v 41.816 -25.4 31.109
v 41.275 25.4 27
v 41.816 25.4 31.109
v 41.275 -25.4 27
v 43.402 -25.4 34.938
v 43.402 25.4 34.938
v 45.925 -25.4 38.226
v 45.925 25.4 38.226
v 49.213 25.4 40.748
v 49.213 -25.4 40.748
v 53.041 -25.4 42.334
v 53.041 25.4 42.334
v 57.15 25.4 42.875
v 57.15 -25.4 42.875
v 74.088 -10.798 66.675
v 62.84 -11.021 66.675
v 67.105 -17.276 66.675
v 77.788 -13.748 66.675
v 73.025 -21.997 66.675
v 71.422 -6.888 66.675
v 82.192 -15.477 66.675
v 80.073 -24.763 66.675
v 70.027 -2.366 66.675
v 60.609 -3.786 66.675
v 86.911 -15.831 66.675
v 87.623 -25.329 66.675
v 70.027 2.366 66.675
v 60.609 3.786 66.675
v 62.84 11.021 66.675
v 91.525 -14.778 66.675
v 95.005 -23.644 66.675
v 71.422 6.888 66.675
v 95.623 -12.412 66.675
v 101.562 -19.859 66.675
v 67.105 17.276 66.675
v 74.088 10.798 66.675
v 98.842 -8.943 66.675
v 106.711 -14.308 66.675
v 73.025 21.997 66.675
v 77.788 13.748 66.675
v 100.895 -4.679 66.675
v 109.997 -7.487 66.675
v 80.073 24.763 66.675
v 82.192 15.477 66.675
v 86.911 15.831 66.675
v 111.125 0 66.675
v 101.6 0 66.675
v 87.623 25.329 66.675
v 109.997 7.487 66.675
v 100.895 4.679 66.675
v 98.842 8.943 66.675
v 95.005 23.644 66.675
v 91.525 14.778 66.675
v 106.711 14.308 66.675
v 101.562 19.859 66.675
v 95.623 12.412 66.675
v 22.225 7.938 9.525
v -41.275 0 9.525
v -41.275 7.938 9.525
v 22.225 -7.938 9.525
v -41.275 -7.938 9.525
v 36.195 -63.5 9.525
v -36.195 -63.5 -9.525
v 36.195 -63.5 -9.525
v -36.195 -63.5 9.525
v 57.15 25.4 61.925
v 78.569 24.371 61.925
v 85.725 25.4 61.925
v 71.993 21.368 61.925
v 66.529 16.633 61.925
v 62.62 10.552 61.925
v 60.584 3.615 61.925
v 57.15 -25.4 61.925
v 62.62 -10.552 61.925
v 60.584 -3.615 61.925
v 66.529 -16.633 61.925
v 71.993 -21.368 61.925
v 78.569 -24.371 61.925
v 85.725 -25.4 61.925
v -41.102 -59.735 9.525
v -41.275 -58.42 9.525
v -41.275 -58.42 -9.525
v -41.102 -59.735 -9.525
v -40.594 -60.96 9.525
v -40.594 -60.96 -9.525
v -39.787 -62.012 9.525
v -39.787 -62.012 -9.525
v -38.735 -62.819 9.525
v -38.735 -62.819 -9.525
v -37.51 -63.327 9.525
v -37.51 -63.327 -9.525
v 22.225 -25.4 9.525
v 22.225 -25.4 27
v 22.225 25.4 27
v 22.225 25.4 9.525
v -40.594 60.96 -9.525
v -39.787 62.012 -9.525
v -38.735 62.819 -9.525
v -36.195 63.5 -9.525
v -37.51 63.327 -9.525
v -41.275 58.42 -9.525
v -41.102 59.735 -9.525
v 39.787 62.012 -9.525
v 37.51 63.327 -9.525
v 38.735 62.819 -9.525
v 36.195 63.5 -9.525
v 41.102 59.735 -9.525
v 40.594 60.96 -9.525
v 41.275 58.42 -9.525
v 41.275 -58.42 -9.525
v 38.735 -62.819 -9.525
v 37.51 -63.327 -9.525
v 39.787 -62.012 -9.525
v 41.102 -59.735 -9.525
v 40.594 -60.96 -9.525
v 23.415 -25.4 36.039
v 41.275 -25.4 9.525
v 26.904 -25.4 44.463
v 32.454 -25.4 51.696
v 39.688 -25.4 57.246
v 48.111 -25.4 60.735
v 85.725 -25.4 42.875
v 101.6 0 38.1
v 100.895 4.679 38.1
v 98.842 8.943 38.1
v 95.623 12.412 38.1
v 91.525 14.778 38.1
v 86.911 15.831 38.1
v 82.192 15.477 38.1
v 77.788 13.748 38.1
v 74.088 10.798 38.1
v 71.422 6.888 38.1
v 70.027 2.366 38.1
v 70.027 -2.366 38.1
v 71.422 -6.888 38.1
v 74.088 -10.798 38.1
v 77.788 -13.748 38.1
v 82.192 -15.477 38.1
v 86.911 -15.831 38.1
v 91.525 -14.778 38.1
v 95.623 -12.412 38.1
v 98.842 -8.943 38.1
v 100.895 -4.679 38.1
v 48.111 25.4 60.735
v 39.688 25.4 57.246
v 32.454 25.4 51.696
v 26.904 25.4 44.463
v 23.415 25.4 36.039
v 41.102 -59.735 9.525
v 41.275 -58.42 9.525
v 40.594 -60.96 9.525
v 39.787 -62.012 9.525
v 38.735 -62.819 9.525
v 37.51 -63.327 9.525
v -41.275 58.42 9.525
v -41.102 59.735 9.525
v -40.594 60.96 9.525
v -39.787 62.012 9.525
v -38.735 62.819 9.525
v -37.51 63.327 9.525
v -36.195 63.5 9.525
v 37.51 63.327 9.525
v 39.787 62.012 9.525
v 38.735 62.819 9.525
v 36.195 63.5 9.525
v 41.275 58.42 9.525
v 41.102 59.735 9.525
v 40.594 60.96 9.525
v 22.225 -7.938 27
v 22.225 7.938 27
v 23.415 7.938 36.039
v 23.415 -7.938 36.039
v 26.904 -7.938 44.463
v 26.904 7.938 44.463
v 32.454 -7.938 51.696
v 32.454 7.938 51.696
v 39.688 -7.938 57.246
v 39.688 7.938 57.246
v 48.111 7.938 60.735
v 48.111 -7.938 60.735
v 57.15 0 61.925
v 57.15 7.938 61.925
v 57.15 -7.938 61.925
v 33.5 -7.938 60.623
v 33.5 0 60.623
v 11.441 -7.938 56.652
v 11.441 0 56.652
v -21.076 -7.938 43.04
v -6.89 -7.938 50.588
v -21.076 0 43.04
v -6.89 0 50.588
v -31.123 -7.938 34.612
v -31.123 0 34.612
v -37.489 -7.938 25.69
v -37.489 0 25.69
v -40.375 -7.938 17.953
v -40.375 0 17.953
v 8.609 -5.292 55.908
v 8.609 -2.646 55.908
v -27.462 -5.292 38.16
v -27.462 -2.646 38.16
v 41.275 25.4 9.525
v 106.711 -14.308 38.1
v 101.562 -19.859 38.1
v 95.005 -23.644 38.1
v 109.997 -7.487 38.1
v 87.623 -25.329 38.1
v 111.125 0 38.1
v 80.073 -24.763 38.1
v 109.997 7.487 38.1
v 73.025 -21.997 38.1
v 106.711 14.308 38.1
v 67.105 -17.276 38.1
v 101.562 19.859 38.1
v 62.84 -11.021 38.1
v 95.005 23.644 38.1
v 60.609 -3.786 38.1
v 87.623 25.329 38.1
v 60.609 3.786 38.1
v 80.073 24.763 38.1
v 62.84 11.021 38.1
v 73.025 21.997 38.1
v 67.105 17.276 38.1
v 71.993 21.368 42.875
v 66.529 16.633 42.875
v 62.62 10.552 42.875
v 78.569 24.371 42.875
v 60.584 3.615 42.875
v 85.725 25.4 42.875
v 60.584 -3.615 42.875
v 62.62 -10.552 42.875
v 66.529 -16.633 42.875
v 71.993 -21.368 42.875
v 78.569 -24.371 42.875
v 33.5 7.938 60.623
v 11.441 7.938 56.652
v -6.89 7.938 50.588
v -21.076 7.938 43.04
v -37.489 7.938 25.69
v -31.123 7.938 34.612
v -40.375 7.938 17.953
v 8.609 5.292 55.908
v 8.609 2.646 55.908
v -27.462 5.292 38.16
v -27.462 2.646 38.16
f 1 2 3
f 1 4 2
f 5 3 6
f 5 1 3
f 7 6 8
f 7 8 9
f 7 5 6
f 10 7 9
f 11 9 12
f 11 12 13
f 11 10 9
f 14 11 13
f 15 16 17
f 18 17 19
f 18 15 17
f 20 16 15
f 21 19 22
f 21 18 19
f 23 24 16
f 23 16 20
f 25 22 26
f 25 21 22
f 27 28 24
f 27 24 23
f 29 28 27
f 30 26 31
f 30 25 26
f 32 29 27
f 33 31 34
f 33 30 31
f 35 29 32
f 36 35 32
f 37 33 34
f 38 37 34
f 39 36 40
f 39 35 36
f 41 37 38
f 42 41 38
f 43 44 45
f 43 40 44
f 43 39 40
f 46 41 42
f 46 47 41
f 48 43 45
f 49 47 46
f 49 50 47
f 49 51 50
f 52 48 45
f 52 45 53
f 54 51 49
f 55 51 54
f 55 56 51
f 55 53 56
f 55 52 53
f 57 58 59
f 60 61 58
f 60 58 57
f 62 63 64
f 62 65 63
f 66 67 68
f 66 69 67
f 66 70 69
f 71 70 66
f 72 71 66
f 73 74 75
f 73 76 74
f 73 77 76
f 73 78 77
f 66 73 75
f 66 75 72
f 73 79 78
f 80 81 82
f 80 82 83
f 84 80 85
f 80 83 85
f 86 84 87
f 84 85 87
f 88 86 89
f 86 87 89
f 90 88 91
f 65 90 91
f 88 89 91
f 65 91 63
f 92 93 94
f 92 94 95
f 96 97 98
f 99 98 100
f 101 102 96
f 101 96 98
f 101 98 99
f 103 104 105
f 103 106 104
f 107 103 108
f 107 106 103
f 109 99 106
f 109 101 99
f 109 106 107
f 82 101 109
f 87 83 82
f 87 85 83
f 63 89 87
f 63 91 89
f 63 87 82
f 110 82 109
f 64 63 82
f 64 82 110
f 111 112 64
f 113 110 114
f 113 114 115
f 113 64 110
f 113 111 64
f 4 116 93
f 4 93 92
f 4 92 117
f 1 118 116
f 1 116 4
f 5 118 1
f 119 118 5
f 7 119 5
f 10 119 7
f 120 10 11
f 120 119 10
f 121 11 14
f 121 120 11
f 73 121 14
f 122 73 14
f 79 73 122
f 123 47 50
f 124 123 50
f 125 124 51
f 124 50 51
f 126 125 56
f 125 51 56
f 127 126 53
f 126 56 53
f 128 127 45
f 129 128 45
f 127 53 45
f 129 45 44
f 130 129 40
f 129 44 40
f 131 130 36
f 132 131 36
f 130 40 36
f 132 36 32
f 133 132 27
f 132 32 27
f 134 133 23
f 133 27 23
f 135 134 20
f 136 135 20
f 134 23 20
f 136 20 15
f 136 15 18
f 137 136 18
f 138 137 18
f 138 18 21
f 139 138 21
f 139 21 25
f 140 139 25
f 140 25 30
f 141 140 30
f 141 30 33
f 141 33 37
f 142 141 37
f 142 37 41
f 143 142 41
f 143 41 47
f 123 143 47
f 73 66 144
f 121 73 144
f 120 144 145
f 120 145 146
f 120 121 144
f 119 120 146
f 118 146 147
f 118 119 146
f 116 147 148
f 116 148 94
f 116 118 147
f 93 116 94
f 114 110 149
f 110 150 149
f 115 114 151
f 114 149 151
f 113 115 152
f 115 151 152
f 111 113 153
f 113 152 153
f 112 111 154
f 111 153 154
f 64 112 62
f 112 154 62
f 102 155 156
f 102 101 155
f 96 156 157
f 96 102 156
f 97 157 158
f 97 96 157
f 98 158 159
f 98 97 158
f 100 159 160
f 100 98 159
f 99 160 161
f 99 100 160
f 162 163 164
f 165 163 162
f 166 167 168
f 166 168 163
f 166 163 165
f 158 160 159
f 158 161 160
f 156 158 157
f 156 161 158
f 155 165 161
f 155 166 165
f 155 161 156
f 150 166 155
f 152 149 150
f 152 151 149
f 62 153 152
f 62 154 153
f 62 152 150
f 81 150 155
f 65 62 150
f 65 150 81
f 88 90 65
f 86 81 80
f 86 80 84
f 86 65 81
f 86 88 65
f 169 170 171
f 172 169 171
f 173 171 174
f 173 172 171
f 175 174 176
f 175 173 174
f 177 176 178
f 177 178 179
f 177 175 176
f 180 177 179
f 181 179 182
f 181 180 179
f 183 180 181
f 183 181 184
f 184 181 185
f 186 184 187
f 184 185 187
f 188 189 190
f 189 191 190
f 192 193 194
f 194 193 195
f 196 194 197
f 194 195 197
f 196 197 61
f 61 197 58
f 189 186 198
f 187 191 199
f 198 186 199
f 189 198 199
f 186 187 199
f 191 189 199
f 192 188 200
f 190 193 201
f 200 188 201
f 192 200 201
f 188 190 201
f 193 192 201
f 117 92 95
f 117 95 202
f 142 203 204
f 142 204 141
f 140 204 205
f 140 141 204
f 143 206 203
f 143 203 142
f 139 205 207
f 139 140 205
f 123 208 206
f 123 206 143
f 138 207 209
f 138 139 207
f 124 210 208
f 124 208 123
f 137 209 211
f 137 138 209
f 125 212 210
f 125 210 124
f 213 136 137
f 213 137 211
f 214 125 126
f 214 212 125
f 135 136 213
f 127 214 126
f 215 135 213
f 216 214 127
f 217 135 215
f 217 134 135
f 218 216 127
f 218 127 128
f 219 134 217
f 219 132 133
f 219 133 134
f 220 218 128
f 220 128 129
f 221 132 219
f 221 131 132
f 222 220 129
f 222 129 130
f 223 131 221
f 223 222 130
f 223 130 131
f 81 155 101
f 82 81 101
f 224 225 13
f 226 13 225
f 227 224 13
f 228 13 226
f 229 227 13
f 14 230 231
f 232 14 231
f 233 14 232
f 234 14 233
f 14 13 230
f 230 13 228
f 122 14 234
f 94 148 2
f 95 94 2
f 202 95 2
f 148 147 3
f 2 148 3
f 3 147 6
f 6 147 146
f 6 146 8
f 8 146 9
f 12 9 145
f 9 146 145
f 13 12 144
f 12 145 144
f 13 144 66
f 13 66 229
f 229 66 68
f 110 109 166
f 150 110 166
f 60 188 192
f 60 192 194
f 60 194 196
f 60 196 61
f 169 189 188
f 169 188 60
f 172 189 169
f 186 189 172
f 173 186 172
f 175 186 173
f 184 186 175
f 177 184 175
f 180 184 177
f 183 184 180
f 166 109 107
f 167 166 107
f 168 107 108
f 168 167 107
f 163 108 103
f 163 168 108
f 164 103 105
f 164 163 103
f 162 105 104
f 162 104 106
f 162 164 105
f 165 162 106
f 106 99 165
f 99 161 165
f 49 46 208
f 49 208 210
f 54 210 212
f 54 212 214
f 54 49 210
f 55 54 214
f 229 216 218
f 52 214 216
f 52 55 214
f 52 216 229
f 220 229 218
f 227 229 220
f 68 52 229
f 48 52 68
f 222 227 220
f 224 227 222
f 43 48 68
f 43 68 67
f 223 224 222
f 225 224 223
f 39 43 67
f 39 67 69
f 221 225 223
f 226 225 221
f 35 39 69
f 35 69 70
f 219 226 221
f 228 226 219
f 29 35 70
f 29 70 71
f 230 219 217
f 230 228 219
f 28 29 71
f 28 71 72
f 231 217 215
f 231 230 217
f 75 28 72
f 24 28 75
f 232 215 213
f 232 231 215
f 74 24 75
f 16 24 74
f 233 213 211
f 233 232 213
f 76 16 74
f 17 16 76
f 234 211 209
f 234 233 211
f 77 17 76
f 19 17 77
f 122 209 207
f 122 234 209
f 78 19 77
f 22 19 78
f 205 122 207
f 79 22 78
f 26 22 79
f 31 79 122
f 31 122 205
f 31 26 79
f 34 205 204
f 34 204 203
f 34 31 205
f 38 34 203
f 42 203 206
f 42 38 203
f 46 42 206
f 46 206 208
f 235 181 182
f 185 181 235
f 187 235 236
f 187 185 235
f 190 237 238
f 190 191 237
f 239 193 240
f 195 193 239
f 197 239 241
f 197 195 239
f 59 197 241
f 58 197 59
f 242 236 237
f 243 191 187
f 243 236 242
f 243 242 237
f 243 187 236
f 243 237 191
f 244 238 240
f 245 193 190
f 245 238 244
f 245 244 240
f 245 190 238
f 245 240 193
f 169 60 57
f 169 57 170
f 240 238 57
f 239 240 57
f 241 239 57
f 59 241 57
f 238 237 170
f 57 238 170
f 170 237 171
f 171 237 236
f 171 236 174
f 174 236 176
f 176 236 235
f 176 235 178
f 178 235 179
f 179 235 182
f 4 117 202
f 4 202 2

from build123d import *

# Parameters (mm, degrees)
F1_DEPTH = 63.5
F0_W     = 25.4
F0_H     = 19.05
F2_DEPTH = 25.4
F3_DEPTH = 7.9375
F5_R     = 5.08
F6_R     = 15.875
F7_DEPTH = 25.4
F8_DEPTH = 101.601


with BuildPart() as f1:
    # F0 (on Front) → F1 (new body, symmetric)
    with BuildSketch(Plane.XZ):
        Polygon((22.225, 9.525), (-41.275, 9.525), (-41.275, -9.525), (41.275, -9.525), (41.275, 9.525), align=None)
    extrude(amount=F1_DEPTH, both=True)

    # F5
    f5_edges = [f1.edges().sort_by_distance(p)[0] for p in [
        (41.275, -63.5, 0),
        (-41.275, -63.5, 0),
        (-41.275, 63.5, 0),
        (41.275, 63.5, 0),
    ]]
    fillet(f5_edges, radius=F5_R)


with BuildPart() as f2:
    # F0 (on Front) → F2 (new body, symmetric)
    with BuildSketch(Plane.XZ):
        with Locations((73.025, 52.4002)):
            Rectangle(F0_W, F0_H)
        with BuildLine():
            Line((22.225, 27.0002), (22.225, 9.525))
            Line((22.225, 9.525), (41.275, 9.525))
            Line((41.275, 9.525), (41.275, 27.0002))
            ThreePointArc((41.275, 27.0002), (45.9246798487, 38.2255201513), (57.15, 42.8752))
            Line((57.15, 42.8752), (60.325, 42.8752))
            Line((60.325, 42.8752), (60.325, 61.9252))
            Line((60.325, 61.9252), (57.15, 61.9252))
            ThreePointArc((57.15, 61.9252), (32.4542956671, 51.6959043329), (22.225, 27.0002))
        make_face()
    extrude(amount=F2_DEPTH, both=True)

    # F0 (on Front) → F4 (revolve)
    with BuildSketch(Plane.XZ):
        Polygon((85.725, 66.675), (85.725, 61.9252), (85.725, 42.8752), (85.725, 38.1), (111.125, 38.1), (111.125, 66.675), align=None)
    revolve(axis=Axis((85.725, 0, 52.3875), (0, 0, 1)))

    # F6 (on face) → F7 (join)
    with BuildSketch(Plane.XY.offset(66.675)):
        with Locations((85.725, 0)):
            Circle(F6_R)
    extrude(amount=F7_DEPTH)

    # F8 (cut, through all): a face of the model
    f8_faces = [f2.faces().sort_by_distance(p)[0] for p in [
        (85.725, 0, 92.075),
    ]]
    extrude(f8_faces, amount=-F8_DEPTH, mode=Mode.SUBTRACT)


with BuildPart() as f3:
    # F0 (on Front) → F3 (new body, symmetric)
    with BuildSketch(Plane.XZ):
        with BuildLine():
            add(Edge.make_bspline(
                [(57.15, 61.9252), (5.6373281404, 62.0564445853), (-41.8535582721, 43.3202907443), (-41.275, 9.525)],
                knots=[0, 0, 0, 0, 111.5045361635, 111.5045361635, 111.5045361635, 111.5045361635], degree=3))
            Line((-41.275, 9.525), (22.225, 9.525))
            Line((22.225, 9.525), (22.225, 27.0002))
            ThreePointArc((22.225, 27.0002), (32.4542956671, 51.6959043329), (57.15, 61.9252))
        make_face()
    extrude(amount=F3_DEPTH, both=True)


solid = Compound([f1.part, f2.part, f3.part])
